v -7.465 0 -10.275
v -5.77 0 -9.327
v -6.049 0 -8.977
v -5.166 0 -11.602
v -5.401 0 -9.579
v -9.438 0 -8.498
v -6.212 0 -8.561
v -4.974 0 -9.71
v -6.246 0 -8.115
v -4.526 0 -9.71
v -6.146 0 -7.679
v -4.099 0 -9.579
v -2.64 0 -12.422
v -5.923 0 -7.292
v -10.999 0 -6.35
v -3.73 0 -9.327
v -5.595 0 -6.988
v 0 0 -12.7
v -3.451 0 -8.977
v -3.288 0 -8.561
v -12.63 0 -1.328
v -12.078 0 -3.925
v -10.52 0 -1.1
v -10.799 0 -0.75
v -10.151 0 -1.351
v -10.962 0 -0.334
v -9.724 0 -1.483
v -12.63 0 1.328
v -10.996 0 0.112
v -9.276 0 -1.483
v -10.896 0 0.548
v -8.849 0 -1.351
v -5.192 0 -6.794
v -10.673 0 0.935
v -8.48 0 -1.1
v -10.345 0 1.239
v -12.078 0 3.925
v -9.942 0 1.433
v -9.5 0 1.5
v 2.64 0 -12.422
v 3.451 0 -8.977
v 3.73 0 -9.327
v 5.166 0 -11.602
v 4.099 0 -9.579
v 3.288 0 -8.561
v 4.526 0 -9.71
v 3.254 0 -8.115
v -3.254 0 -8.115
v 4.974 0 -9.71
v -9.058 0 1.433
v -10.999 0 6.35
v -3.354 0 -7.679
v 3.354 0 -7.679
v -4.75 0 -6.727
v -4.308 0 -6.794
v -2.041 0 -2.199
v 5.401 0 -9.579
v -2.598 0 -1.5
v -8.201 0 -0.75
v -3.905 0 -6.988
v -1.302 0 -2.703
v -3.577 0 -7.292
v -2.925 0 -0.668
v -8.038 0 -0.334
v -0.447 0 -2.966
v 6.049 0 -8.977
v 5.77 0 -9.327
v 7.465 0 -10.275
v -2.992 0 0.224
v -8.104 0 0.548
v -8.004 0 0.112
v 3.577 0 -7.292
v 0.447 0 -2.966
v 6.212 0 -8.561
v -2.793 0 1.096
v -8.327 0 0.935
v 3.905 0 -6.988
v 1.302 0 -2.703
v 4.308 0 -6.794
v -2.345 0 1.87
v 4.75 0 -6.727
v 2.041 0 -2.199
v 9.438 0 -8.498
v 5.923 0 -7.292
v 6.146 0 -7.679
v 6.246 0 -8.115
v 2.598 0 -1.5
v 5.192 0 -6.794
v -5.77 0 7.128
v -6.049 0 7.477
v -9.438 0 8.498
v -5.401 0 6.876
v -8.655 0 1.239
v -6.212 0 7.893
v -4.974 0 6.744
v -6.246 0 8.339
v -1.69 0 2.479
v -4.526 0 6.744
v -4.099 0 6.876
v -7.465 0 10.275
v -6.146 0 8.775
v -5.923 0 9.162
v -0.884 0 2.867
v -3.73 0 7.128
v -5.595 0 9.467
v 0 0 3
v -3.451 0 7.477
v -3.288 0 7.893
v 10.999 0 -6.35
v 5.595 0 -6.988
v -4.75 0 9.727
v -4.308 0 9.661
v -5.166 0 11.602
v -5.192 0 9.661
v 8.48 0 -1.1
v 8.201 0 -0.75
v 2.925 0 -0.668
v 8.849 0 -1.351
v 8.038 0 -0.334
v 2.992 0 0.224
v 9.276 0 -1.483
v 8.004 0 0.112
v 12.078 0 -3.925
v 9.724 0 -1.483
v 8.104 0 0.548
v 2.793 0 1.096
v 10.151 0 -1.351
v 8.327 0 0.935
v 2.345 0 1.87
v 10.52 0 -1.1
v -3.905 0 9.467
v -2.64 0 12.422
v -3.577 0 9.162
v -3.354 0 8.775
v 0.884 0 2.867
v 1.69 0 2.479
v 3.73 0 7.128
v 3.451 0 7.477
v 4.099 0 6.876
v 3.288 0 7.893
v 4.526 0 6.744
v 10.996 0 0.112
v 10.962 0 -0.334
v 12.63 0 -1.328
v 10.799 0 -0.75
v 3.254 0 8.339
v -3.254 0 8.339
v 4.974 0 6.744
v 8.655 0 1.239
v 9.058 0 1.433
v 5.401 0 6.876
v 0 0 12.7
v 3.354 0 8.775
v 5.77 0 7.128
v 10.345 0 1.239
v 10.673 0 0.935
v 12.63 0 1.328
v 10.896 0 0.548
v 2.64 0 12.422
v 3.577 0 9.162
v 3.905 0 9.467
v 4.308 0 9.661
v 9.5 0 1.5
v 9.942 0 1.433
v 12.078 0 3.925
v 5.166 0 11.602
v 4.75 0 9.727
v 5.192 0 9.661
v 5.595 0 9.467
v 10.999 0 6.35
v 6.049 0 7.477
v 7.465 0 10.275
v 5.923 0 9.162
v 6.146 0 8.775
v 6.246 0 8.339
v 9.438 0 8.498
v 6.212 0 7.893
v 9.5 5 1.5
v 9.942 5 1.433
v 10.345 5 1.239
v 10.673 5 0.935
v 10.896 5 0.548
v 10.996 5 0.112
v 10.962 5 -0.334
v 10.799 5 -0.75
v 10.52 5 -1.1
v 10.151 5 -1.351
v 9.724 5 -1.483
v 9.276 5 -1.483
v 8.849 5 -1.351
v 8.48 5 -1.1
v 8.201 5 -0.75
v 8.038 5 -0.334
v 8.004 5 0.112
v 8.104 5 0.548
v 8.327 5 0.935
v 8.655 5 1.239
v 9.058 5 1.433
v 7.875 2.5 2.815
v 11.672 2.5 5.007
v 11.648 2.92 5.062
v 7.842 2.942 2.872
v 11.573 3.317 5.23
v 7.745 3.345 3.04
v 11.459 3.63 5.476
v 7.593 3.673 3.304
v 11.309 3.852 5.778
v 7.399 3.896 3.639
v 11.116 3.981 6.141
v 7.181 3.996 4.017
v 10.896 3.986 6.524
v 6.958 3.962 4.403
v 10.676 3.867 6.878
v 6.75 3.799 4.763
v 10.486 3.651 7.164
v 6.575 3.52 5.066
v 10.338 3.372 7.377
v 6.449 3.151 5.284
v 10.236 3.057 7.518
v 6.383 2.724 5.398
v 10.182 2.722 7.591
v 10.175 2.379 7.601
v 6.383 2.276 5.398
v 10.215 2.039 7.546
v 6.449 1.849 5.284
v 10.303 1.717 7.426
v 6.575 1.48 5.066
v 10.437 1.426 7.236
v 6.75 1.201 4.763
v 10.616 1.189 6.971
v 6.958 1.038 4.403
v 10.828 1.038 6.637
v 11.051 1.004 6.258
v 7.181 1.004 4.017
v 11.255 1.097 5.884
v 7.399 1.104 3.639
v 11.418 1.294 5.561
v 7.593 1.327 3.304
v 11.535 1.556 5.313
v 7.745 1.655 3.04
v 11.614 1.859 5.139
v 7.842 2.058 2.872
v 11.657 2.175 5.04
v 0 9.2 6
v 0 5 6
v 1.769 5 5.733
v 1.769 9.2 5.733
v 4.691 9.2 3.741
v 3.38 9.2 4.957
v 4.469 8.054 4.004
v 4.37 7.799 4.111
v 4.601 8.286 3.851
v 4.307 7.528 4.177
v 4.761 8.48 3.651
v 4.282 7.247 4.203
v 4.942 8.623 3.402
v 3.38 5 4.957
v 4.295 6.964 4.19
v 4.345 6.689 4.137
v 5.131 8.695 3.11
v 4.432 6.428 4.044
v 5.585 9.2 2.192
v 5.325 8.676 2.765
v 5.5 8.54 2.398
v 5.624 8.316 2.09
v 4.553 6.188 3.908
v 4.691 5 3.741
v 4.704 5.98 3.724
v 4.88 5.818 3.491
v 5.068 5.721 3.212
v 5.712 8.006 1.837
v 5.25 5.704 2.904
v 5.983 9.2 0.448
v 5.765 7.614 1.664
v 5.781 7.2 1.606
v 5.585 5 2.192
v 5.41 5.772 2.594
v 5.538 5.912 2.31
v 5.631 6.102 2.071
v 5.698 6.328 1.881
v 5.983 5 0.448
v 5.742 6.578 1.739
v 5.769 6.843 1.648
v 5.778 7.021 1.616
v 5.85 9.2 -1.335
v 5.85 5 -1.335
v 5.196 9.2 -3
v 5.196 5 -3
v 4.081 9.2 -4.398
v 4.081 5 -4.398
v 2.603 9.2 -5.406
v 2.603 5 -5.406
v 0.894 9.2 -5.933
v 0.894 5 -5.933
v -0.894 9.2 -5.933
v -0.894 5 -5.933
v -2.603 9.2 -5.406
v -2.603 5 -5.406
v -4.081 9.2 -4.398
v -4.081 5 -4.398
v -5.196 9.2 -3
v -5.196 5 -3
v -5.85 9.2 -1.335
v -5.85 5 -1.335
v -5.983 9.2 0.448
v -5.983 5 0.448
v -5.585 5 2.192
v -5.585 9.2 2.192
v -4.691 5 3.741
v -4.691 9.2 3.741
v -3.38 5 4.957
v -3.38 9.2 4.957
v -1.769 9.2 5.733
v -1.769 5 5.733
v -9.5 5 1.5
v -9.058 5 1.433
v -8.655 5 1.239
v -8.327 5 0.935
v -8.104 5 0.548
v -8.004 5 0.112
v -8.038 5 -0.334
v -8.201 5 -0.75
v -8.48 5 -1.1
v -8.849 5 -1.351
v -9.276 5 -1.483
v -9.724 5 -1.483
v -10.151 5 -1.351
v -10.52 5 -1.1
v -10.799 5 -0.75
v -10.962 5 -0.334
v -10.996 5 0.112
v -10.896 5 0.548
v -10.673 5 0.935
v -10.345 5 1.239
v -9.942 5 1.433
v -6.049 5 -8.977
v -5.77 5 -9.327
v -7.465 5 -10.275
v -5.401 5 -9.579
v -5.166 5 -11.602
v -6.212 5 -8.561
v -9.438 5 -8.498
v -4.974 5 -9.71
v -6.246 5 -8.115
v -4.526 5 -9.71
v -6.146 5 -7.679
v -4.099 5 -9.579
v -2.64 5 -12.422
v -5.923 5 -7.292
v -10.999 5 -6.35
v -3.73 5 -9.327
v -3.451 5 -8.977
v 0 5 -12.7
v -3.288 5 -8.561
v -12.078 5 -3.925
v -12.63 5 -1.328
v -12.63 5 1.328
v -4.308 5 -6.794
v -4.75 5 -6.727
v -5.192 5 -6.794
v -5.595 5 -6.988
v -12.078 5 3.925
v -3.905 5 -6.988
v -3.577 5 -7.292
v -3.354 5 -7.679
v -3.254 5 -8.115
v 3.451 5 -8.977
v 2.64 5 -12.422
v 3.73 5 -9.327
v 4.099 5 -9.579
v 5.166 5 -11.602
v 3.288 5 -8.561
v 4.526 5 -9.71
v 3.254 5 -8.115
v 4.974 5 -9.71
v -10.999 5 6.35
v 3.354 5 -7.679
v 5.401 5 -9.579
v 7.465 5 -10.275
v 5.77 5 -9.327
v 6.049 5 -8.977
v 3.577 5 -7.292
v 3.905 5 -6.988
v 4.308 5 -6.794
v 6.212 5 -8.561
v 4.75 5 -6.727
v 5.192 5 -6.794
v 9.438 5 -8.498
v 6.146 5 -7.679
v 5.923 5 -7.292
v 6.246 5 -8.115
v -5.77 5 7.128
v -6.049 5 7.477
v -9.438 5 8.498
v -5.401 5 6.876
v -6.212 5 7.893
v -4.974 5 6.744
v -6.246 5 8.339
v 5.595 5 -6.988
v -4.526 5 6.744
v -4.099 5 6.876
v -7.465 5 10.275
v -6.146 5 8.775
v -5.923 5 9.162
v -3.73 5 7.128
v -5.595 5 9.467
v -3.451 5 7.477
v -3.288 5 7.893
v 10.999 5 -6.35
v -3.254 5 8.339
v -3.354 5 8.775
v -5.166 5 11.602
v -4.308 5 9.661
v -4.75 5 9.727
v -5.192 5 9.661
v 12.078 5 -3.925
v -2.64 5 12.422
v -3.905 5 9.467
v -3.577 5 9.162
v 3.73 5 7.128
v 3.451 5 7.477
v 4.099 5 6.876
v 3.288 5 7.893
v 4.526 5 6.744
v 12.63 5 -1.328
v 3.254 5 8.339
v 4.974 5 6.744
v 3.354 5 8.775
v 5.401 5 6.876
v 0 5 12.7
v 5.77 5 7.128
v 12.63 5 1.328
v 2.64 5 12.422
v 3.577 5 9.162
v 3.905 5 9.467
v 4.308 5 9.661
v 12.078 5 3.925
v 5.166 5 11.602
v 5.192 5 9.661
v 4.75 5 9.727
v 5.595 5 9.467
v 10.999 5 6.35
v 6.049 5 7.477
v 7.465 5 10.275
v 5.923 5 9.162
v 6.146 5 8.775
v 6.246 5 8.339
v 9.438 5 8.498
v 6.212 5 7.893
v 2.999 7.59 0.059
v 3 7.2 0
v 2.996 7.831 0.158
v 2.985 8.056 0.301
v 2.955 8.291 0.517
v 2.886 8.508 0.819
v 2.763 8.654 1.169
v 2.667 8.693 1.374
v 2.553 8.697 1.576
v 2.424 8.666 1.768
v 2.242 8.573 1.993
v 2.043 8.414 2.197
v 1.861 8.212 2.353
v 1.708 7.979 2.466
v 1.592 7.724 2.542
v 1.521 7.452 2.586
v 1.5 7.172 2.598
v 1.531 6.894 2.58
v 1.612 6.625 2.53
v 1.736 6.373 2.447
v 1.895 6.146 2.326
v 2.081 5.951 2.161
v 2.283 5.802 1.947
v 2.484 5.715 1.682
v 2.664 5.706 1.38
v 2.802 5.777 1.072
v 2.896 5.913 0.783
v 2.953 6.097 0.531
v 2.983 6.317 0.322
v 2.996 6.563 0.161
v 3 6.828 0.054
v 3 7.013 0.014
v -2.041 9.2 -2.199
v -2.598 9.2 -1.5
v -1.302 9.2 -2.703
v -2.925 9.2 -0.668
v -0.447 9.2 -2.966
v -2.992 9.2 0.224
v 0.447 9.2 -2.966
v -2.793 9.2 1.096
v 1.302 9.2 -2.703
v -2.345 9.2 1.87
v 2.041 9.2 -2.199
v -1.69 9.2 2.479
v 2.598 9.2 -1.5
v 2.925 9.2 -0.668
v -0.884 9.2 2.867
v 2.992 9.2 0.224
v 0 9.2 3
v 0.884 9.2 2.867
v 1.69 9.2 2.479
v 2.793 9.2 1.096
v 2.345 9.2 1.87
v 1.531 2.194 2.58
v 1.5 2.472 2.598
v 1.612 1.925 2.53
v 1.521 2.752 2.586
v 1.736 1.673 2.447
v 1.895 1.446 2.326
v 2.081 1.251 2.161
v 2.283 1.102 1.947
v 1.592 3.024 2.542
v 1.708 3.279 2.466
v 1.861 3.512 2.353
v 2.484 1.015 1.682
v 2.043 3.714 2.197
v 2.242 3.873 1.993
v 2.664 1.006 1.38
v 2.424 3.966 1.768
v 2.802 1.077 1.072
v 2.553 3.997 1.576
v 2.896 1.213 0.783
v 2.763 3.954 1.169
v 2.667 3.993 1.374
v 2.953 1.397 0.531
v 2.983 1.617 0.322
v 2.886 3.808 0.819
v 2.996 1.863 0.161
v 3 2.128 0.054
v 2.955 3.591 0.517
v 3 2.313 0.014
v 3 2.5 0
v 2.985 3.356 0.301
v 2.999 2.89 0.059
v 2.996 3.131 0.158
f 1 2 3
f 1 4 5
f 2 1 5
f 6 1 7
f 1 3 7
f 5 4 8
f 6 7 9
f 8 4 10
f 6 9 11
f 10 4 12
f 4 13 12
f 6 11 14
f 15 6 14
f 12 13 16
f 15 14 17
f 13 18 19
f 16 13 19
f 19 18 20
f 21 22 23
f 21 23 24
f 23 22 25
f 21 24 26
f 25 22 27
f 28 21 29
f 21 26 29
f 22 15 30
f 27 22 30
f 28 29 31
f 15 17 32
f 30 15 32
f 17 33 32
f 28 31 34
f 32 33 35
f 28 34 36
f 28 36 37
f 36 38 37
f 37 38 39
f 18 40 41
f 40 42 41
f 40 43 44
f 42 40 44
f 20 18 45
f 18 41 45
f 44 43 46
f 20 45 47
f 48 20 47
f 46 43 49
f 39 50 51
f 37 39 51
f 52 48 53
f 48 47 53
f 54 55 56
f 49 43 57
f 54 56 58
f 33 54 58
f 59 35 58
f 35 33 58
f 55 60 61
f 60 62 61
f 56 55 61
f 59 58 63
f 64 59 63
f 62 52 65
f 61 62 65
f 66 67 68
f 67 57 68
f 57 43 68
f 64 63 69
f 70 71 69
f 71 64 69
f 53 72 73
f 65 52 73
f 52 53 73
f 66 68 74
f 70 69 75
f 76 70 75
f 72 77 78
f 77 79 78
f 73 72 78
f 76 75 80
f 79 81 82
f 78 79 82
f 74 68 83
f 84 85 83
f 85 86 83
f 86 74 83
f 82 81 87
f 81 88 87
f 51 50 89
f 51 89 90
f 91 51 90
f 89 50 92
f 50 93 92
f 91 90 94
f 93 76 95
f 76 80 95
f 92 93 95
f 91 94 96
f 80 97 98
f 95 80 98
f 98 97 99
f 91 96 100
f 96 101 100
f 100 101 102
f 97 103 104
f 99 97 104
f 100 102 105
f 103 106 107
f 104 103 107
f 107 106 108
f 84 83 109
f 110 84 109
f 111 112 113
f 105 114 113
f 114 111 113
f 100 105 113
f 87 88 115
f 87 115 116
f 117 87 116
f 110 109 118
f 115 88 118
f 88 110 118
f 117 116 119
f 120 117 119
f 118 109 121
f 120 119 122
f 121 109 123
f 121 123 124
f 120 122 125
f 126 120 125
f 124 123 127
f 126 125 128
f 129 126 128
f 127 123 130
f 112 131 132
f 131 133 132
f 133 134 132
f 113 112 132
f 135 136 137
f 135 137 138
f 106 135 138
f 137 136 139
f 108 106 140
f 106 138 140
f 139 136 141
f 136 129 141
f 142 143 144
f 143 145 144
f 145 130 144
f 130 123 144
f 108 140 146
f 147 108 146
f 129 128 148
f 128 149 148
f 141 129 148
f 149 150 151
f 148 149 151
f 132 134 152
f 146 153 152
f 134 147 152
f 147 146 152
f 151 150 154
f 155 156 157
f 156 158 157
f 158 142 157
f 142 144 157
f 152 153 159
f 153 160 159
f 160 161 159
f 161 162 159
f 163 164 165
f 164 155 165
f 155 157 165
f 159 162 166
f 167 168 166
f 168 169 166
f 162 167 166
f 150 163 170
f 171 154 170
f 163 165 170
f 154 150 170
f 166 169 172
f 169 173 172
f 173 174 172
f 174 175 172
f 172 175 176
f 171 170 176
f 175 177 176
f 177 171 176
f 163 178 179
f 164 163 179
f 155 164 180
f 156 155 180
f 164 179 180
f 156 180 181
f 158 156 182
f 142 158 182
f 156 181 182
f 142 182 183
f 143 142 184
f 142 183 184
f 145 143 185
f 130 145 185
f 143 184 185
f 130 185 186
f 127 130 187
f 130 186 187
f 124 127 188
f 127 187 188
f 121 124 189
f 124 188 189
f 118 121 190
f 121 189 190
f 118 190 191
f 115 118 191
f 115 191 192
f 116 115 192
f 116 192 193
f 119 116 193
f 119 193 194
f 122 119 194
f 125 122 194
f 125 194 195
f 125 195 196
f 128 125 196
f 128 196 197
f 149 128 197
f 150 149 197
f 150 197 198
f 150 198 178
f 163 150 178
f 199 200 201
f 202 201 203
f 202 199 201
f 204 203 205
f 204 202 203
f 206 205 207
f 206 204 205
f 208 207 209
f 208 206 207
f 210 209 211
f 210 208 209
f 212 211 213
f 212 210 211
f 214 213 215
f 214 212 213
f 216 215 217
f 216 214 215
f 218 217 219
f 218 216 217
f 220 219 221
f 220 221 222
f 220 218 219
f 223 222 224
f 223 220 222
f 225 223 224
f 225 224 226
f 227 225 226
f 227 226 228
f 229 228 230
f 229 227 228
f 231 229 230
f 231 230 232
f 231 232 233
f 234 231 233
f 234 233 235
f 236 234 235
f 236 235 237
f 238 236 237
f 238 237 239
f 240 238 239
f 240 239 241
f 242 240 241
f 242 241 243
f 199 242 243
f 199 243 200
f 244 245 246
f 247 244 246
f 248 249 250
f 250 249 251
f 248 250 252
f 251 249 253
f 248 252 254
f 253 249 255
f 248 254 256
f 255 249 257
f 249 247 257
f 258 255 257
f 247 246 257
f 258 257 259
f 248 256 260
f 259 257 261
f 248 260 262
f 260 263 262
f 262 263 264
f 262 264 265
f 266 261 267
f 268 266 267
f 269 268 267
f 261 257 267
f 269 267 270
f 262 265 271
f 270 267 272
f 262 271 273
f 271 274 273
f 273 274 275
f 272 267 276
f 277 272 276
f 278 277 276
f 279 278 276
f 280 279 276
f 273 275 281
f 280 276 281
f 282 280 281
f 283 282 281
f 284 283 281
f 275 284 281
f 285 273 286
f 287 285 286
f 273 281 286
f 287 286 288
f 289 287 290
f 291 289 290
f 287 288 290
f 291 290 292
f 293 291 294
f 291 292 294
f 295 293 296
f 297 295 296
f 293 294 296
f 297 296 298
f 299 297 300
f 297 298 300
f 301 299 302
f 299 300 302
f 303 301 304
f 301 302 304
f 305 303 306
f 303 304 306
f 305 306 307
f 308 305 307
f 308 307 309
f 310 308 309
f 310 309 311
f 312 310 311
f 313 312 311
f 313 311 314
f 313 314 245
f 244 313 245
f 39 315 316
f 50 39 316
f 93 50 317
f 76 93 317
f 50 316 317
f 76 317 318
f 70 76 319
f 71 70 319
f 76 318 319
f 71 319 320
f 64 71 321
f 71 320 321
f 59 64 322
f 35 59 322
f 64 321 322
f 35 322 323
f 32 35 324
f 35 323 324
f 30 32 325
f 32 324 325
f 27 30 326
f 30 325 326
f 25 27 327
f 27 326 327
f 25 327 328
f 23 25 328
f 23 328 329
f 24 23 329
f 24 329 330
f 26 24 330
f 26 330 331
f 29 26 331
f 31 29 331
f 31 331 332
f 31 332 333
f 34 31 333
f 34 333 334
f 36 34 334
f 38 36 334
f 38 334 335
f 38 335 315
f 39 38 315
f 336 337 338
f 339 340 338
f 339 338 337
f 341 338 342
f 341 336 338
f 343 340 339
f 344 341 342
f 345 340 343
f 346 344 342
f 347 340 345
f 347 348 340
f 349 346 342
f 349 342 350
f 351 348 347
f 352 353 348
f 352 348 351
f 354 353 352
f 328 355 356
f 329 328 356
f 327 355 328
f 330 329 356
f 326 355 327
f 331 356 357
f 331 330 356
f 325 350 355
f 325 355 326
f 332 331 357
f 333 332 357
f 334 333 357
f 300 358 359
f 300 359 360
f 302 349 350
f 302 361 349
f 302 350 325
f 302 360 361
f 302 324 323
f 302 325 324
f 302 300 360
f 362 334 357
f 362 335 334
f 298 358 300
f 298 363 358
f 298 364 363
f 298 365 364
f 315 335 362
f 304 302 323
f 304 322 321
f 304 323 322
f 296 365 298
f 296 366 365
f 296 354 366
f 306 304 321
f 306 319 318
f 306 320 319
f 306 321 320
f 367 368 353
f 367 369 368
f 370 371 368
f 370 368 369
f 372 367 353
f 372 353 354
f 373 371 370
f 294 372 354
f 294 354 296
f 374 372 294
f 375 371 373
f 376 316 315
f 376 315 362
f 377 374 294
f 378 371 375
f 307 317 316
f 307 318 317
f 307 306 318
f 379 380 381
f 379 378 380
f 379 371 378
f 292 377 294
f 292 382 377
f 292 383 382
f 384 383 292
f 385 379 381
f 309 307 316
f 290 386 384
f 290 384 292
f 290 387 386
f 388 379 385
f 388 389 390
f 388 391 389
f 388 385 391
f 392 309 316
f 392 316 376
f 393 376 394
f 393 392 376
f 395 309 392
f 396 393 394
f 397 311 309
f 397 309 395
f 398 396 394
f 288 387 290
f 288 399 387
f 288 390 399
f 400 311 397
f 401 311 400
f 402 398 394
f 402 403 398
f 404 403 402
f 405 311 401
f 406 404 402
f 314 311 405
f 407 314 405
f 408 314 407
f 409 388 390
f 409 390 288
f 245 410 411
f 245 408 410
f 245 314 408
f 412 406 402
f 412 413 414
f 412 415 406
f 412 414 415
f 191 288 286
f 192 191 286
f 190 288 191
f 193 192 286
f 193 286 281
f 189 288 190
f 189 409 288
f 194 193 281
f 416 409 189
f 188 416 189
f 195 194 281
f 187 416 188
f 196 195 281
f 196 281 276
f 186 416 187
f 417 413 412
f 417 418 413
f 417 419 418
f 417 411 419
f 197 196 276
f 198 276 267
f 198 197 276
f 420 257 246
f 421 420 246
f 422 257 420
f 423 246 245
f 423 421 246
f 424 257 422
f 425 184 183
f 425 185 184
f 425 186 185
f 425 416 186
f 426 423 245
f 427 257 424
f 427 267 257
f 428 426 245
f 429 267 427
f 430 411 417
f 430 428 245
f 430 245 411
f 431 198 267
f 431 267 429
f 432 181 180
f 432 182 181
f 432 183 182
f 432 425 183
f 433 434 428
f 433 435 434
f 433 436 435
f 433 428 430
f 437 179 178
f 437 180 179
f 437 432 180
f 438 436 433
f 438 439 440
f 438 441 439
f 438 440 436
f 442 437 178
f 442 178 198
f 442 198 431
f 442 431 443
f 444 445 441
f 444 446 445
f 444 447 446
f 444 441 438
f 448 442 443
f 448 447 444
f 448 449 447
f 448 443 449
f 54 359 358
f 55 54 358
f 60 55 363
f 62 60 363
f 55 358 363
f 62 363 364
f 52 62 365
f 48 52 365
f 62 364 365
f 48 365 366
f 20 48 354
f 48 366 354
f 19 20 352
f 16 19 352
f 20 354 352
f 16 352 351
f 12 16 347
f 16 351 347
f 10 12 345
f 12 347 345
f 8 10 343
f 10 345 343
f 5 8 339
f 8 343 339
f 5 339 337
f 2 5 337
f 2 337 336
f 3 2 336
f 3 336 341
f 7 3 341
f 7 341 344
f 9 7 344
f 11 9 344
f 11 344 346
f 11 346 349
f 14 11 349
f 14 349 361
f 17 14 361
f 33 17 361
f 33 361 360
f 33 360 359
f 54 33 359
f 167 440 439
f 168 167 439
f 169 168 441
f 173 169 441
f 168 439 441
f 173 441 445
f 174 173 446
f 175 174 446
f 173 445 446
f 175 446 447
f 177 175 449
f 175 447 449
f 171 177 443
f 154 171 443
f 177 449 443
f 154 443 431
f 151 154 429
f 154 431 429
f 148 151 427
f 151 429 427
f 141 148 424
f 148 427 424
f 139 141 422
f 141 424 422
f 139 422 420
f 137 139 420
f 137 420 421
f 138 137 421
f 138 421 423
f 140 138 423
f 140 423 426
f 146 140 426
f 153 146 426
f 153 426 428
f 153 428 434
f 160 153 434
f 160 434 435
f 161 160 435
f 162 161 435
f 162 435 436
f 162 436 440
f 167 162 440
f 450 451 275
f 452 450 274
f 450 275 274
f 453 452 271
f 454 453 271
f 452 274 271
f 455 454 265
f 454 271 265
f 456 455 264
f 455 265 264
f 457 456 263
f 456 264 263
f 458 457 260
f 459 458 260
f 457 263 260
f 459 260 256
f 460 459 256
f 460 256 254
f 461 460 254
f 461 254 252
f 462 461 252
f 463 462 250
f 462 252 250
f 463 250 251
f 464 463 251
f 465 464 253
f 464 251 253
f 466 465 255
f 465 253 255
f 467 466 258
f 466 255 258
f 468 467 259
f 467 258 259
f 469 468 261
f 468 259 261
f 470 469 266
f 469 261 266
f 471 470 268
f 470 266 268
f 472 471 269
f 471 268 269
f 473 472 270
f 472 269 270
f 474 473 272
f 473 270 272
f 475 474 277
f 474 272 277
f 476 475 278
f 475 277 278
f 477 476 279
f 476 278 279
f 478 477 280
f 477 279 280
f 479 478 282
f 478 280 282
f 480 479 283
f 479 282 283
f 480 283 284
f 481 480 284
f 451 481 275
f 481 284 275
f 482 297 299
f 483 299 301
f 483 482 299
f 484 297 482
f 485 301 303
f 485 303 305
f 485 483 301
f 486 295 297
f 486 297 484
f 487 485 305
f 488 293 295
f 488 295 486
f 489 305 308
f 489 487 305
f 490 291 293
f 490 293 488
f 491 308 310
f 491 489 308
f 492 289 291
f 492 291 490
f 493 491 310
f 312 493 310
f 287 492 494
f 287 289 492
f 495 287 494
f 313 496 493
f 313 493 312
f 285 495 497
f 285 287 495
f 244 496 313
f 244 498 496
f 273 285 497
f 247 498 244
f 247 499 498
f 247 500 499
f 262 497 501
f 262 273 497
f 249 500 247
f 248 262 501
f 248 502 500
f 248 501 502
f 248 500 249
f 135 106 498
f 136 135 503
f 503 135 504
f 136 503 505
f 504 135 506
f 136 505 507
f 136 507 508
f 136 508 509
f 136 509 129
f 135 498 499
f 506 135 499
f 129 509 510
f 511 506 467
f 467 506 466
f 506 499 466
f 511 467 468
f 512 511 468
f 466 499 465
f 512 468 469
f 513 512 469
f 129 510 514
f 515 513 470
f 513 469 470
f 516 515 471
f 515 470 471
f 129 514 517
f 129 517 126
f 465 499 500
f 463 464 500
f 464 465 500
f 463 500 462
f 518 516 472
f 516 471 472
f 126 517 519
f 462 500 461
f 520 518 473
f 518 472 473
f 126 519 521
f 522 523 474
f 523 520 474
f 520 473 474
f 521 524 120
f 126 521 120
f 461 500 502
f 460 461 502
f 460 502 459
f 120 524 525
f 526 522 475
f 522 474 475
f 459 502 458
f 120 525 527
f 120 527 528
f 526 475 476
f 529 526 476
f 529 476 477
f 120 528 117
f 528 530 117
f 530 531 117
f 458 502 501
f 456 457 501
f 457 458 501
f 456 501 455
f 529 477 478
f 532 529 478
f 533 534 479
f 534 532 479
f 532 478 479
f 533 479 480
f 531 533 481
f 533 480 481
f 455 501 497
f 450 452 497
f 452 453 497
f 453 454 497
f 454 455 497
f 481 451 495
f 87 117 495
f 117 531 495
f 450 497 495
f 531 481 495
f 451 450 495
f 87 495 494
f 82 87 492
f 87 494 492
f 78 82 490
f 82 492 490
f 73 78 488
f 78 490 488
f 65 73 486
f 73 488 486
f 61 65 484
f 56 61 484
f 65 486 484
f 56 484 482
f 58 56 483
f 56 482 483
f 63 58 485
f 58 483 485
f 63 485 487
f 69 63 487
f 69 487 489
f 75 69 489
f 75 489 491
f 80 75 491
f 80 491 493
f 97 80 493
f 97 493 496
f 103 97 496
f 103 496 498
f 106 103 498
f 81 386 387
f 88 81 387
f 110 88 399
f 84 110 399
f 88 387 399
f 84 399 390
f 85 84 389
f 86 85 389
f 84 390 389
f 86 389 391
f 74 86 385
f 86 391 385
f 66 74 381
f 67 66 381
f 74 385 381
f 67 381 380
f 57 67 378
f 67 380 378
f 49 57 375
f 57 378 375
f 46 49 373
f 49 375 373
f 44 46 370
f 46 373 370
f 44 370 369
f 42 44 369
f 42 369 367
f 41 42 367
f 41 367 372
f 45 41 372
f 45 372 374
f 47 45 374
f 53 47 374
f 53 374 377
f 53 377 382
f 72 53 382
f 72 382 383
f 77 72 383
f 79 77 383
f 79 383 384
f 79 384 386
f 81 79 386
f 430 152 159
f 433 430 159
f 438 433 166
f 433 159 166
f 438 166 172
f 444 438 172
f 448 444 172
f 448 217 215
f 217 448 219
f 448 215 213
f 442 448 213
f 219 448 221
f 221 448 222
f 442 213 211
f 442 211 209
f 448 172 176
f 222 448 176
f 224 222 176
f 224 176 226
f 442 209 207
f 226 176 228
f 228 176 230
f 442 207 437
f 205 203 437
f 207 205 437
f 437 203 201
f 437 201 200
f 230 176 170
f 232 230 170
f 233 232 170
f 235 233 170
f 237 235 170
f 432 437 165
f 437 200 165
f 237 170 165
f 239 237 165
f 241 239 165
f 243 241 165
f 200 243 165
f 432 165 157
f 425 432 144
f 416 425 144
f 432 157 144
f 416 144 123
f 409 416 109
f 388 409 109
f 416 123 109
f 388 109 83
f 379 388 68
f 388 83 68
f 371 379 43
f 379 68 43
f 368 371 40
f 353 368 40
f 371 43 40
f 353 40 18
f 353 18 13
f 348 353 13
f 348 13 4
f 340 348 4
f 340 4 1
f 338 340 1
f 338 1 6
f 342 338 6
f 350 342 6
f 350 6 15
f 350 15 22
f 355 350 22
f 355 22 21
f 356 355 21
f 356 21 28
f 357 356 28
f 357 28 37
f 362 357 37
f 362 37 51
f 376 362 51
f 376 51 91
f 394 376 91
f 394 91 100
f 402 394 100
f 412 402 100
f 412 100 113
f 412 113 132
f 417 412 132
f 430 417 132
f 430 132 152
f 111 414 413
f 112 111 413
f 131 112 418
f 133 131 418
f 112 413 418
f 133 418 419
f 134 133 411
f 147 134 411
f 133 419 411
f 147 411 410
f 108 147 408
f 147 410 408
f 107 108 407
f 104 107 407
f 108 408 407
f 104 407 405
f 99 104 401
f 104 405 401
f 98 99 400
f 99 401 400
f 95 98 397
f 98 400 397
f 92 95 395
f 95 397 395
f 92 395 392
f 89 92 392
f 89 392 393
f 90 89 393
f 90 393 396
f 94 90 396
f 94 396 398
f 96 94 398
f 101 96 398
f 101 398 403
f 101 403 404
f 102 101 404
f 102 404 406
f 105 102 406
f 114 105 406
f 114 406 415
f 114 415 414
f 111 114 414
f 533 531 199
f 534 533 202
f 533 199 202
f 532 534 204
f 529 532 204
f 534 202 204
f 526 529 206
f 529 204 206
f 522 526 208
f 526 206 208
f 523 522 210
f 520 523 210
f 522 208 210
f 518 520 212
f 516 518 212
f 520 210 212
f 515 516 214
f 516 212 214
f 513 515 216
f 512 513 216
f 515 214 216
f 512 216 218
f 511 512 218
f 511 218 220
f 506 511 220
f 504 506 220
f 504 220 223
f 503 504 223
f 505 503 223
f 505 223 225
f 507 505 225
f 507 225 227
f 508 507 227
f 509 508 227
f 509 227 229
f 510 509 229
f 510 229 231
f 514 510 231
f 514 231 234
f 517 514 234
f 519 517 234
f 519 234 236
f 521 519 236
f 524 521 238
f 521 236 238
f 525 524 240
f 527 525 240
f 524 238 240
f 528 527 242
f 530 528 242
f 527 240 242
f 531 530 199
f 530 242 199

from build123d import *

# Parameters (mm, degrees)
SKETCH1_R           = 12.7
BOSS_EXTRUDE1_DEPTH = 5
SKETCH2_R           = 6
BOSS_EXTRUDE2_DEPTH = 4.2
SKETCH3_R           = 3
SKETCH3_R_2         = 1.5
CUT_EXTRUDE1_DEPTH  = 14.2
SKETCH5_R           = 1.5
CUT_EXTRUDE2_DEPTH  = 7.1


with BuildPart() as part:
    # Sketch1 → Boss-Extrude1 (new body)
    with BuildSketch(Plane(origin=(0, 0, 0), x_dir=(1, 0, 0), z_dir=(0, 1, 0))):
        with Locations(Location((0, 0, 0), (0, 0, 270))):
            Circle(SKETCH1_R)
    extrude(amount=BOSS_EXTRUDE1_DEPTH)

    # Sketch2 → Boss-Extrude2 (add)
    with BuildSketch(Plane(origin=(0, 5, 0), x_dir=(1, 0, 0), z_dir=(0, 1, 0))):
        with Locations(Location((0, 0, 0), (0, 0, 270))):
            Circle(SKETCH2_R)
    extrude(amount=BOSS_EXTRUDE2_DEPTH)

    # Sketch3 → Cut-Extrude1 (cut)
    with BuildSketch(Plane(origin=(0, 9.2, 0), x_dir=(1, 0, 0), z_dir=(0, 1, 0))):
        with Locations(Location((0, 0, 0), (0, 0, 270))):
            Circle(SKETCH3_R)
        with Locations(Location((-9.5, 0, 0), (0, 0, 270))):
            Circle(SKETCH3_R_2)
        with Locations(Location((-4.75, 8.227241336, 0), (0, 0, 270))):
            Circle(SKETCH3_R_2)
        with Locations(Location((4.75, 8.227241336, 0), (0, 0, 270))):
            Circle(SKETCH3_R_2)
        with Locations(Location((9.5, 0, 0), (0, 0, 270))):
            Circle(SKETCH3_R_2)
        with Locations(Location((4.75, -8.227241336, 0), (0, 0, 270))):
            Circle(SKETCH3_R_2)
        with Locations(Location((-4.75, -8.227241336, 0), (0, 0, 270))):
            Circle(SKETCH3_R_2)
    extrude(amount=-CUT_EXTRUDE1_DEPTH, mode=Mode.SUBTRACT)

    # Sketch5 → Cut-Extrude2 (cut, symmetric)
    with BuildSketch(Plane(origin=(7.125, 0, 4.113620668), x_dir=(0.5000000000000071, 0, -0.8660254037844346), z_dir=(0.8660254037844346, 0, 0.5000000000000071))):
        with Locations((0, 2.5)):
            Circle(SKETCH5_R)
        with Locations((0, 7.2)):
            Circle(SKETCH5_R)
    extrude(amount=CUT_EXTRUDE2_DEPTH, both=True, mode=Mode.SUBTRACT)


solid = part.part
